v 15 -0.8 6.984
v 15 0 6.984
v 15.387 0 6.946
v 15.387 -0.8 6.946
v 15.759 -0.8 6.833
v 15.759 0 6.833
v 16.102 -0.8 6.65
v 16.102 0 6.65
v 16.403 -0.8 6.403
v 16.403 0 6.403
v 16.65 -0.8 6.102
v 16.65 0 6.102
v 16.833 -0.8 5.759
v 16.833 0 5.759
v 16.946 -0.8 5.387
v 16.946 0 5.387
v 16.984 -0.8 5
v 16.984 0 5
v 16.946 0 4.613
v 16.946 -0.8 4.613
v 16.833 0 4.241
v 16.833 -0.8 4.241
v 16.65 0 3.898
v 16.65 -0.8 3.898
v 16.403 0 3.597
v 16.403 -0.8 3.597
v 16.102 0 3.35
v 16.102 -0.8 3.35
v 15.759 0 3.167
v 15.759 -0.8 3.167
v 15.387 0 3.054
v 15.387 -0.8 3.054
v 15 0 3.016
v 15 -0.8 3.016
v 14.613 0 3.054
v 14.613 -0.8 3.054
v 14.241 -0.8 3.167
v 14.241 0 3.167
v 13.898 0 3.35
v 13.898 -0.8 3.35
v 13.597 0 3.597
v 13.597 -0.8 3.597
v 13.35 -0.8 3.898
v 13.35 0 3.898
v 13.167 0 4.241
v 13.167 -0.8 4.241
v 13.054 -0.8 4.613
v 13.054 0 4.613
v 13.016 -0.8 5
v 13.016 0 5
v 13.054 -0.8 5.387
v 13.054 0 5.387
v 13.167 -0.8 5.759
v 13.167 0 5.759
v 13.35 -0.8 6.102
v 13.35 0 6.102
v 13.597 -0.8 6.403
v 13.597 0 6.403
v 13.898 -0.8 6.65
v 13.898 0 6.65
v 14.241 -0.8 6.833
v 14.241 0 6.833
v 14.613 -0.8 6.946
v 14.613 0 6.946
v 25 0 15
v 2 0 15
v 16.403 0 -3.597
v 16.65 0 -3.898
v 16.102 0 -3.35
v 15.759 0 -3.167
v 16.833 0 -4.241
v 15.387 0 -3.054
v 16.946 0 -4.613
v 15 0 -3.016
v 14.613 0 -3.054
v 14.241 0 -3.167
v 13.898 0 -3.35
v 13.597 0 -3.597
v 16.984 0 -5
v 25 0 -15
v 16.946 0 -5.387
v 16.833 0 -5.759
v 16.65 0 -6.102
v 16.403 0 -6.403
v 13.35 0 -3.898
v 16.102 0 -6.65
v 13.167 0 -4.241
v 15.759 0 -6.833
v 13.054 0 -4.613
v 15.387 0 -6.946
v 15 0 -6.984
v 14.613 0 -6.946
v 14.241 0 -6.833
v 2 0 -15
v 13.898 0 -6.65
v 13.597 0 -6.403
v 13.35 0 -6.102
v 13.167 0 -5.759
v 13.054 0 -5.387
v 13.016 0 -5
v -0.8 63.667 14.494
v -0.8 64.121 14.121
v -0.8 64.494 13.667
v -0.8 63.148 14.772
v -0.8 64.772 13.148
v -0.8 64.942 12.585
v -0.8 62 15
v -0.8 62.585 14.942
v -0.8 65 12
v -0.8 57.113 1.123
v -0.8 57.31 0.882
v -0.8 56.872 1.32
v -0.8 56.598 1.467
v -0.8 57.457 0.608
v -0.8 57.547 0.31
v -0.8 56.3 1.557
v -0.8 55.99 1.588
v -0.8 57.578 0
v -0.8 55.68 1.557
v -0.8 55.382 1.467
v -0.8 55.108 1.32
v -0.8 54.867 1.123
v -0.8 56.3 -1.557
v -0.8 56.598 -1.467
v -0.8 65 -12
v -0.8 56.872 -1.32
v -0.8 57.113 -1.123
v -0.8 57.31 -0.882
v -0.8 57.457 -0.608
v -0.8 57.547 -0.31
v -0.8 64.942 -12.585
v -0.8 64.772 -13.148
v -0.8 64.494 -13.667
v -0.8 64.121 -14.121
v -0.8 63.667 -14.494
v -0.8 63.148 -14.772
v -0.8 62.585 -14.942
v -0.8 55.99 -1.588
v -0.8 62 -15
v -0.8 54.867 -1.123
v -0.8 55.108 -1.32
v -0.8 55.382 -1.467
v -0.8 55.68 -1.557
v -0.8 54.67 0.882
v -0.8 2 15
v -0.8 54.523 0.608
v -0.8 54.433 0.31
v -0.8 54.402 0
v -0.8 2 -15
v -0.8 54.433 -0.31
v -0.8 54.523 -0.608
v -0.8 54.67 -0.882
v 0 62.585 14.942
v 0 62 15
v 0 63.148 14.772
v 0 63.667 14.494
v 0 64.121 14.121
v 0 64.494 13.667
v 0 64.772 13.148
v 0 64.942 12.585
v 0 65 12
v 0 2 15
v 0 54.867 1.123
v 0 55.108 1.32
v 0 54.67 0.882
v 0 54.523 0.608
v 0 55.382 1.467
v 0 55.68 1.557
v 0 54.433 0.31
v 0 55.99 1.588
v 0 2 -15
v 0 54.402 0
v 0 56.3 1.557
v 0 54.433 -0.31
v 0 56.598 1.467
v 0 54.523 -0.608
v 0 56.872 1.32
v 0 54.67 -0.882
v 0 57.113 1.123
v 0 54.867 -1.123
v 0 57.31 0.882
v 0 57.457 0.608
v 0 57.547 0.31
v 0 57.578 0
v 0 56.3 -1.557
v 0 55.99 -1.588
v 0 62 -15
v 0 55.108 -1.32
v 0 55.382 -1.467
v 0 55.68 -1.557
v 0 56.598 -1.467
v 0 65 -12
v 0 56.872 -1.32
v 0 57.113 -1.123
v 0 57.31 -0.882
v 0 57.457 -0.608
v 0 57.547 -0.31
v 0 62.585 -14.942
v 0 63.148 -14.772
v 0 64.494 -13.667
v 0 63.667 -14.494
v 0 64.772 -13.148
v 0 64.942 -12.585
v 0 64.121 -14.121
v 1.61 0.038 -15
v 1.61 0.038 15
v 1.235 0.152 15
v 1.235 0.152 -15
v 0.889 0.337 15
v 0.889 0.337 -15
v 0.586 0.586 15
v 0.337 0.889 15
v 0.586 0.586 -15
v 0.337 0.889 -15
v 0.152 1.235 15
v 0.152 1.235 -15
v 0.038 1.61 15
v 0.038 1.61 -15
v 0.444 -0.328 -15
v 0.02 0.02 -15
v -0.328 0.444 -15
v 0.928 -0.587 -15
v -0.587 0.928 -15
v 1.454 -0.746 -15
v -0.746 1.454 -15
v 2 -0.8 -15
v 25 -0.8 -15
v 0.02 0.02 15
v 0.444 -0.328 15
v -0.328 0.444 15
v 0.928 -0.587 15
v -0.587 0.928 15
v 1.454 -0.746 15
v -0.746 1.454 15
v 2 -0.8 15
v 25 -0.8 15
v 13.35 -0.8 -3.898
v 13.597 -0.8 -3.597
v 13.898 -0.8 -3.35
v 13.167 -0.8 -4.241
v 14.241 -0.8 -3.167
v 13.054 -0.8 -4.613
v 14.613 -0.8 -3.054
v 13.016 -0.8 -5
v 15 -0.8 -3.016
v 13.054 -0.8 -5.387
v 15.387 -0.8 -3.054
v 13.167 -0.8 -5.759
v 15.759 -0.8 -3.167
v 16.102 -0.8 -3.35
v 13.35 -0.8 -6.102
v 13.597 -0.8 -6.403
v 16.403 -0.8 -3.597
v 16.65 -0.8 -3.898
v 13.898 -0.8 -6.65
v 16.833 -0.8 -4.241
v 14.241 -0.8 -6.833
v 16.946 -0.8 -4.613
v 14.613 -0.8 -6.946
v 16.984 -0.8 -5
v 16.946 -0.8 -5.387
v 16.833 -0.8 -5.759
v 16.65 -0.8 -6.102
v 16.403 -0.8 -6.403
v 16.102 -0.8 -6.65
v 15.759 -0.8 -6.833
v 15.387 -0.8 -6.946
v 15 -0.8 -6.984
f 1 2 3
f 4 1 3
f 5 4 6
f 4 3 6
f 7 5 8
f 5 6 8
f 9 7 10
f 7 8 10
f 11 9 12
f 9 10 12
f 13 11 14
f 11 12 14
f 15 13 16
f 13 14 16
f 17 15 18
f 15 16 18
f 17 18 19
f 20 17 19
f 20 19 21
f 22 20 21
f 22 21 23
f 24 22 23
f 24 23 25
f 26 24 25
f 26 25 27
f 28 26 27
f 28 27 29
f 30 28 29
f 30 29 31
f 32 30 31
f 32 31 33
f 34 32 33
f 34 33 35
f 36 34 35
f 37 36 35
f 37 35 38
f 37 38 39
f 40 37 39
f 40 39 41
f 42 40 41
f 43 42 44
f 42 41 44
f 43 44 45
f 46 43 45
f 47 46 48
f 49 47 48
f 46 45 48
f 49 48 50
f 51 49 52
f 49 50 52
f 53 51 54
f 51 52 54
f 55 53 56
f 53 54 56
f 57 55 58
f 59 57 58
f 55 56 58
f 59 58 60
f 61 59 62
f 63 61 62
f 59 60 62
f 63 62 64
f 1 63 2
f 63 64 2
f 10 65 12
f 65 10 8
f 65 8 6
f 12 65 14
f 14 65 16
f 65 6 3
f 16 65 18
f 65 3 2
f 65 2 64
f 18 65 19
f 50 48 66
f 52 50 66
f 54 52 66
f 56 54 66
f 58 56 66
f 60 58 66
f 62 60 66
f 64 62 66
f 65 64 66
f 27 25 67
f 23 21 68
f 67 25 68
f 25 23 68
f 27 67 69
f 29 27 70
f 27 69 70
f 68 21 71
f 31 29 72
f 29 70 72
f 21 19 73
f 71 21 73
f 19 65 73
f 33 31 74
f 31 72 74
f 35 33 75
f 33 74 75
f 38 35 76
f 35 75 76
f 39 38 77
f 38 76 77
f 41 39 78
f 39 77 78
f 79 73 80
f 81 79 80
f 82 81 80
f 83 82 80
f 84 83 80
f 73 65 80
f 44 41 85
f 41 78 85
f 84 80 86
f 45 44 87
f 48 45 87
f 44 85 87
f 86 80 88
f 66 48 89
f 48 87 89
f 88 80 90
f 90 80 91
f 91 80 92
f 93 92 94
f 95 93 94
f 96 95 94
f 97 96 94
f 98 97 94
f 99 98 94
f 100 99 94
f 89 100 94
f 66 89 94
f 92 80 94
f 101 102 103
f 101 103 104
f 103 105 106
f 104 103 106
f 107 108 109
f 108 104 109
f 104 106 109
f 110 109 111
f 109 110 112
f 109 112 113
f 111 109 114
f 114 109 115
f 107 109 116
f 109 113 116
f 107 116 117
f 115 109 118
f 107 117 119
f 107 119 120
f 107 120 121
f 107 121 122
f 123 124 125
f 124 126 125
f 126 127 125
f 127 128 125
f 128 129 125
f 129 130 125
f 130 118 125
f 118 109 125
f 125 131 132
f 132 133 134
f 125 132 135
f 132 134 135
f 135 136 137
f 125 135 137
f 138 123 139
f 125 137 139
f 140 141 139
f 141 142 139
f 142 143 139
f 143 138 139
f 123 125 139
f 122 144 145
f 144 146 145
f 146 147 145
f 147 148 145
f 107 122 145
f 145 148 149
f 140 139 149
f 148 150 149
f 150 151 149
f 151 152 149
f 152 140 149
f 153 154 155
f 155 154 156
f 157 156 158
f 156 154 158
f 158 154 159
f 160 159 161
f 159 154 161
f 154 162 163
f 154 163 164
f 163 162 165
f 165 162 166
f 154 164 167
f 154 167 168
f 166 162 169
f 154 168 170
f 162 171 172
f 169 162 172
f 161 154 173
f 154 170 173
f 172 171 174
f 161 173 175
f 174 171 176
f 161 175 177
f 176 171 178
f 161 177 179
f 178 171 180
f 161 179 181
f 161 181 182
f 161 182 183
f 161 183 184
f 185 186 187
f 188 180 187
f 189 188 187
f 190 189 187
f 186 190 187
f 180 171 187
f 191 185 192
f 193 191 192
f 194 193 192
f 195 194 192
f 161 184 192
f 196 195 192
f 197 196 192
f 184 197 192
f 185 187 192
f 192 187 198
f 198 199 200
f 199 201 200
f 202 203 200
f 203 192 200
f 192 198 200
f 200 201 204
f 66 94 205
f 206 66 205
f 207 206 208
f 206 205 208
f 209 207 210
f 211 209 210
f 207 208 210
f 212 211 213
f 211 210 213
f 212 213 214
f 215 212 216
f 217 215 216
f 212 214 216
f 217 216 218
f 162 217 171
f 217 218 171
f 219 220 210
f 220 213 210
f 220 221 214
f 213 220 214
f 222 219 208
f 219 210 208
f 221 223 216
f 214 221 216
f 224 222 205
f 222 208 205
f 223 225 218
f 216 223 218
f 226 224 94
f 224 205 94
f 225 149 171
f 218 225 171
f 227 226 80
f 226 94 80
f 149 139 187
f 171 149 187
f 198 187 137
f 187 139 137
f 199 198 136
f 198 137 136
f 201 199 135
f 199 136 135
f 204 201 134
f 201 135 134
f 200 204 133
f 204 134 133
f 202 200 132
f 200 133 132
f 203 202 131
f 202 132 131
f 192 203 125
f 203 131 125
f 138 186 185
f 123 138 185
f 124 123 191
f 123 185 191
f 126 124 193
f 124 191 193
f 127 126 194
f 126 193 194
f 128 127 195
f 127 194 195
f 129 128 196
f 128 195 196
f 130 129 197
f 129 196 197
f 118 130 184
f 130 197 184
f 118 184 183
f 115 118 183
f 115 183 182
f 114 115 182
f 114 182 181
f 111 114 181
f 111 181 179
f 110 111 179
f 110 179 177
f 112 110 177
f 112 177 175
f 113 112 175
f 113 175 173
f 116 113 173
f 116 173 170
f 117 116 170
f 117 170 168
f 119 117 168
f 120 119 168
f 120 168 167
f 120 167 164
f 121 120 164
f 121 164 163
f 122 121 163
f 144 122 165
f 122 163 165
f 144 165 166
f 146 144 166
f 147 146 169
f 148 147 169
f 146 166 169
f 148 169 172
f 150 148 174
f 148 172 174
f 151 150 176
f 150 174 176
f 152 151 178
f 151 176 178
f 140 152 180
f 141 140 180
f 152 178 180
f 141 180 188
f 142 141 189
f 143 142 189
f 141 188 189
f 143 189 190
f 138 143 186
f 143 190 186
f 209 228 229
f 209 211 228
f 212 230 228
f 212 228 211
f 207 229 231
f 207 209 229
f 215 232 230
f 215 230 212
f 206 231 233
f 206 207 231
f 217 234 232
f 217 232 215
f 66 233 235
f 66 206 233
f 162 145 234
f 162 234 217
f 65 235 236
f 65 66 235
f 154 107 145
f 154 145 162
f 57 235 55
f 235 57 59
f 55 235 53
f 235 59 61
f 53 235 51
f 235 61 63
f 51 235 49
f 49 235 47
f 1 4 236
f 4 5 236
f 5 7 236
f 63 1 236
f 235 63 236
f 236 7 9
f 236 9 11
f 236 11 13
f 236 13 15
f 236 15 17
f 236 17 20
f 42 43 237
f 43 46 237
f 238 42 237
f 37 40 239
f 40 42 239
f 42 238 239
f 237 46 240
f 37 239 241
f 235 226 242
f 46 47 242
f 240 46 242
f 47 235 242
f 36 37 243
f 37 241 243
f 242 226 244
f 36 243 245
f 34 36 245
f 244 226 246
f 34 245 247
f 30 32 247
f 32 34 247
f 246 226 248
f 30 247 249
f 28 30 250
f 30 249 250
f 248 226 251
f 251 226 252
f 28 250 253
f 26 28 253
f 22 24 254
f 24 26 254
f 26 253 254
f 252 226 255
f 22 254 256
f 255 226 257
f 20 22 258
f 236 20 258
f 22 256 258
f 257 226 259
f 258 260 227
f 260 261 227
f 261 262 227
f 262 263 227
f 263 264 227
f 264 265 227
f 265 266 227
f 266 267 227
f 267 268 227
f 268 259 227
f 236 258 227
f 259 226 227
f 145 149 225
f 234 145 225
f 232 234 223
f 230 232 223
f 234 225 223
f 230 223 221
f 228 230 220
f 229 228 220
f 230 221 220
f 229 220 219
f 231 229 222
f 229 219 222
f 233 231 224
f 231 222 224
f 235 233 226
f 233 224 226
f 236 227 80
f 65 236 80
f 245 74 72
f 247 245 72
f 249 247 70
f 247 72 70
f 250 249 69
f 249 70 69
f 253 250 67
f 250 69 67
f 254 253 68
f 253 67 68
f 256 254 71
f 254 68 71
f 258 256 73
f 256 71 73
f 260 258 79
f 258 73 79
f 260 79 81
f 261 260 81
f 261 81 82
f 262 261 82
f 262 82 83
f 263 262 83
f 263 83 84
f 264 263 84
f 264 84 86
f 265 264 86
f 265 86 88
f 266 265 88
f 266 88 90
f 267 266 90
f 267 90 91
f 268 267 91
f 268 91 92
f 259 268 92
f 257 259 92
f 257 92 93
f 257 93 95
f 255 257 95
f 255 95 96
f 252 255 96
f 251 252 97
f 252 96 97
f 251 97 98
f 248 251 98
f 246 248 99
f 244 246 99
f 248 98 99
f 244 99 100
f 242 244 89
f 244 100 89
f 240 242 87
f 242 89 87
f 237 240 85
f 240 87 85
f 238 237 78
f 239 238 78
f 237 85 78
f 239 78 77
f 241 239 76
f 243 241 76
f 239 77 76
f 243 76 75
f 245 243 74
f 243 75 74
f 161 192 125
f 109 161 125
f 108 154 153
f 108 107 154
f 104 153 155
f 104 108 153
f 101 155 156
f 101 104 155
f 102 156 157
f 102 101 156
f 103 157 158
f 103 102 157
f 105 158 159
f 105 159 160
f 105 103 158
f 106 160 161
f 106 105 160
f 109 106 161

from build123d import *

# Parameters (mm, degrees)
BASE_FLANGE1_DEPTH      = 15
BASE_FLANGE1_DEPTH_BACK = 15
SKETCH2_R               = 1.5875
CUT_EXTRUDE1_DEPTH      = 72.239034244
SKETCH3_R               = 1.984375
CUT_EXTRUDE2_DEPTH      = 10
FILLET1_R               = 3


# Sheet-metal steps are written as plain solids
with BuildPart() as part:
    # Sketch1 → Base-Flange1 (new, two sides: drawn at the far end of the back side and taken through both)
    with BuildSketch(Plane.XY.offset(-BASE_FLANGE1_DEPTH_BACK)):
        with BuildLine():
            Line((25, 0), (2, 0))
            ThreePointArc((2, 0), (0.585786438, 0.585786438), (0, 2))
            Line((0, 2), (0, 65))
            Line((0, 65), (-0.8, 65))
            Line((-0.8, 65), (-0.8, 2))
            ThreePointArc((-0.8, 2), (0.020101013, 0.020101013), (2, -0.8))
            Line((2, -0.8), (25, -0.8))
            Line((25, -0.8), (25, 0))
        make_face()
    extrude(amount=BASE_FLANGE1_DEPTH + BASE_FLANGE1_DEPTH_BACK)

    # Sketch2 → Cut-Extrude1 (cut, through all)
    with BuildSketch(Plane(origin=(0, 0, 0), x_dir=(0, 0, -1), z_dir=(1, 0, 0))):
        with Locations((0, 55.99)):
            Circle(SKETCH2_R)
    extrude(amount=-CUT_EXTRUDE1_DEPTH, mode=Mode.SUBTRACT)

    # Sketch3 → Cut-Extrude2 (cut)
    with BuildSketch(Plane(origin=(0, 0, 0), x_dir=(1, 0, 0), z_dir=(0, 1, 0))):
        with Locations(Location((15, -5, 0), (0, 0, 270))):
            Circle(SKETCH3_R)
        with Locations(Location((15, 5, 0), (0, 0, 270))):
            Circle(SKETCH3_R)
    extrude(amount=-CUT_EXTRUDE2_DEPTH, mode=Mode.SUBTRACT)

    # Fillet1
    fillet1_edges = [part.edges().sort_by_distance(p)[0] for p in [
        (-0.4, 65, 15),
        (-0.4, 65, -15),
    ]]
    fillet(fillet1_edges, radius=FILLET1_R)


solid = part.part
